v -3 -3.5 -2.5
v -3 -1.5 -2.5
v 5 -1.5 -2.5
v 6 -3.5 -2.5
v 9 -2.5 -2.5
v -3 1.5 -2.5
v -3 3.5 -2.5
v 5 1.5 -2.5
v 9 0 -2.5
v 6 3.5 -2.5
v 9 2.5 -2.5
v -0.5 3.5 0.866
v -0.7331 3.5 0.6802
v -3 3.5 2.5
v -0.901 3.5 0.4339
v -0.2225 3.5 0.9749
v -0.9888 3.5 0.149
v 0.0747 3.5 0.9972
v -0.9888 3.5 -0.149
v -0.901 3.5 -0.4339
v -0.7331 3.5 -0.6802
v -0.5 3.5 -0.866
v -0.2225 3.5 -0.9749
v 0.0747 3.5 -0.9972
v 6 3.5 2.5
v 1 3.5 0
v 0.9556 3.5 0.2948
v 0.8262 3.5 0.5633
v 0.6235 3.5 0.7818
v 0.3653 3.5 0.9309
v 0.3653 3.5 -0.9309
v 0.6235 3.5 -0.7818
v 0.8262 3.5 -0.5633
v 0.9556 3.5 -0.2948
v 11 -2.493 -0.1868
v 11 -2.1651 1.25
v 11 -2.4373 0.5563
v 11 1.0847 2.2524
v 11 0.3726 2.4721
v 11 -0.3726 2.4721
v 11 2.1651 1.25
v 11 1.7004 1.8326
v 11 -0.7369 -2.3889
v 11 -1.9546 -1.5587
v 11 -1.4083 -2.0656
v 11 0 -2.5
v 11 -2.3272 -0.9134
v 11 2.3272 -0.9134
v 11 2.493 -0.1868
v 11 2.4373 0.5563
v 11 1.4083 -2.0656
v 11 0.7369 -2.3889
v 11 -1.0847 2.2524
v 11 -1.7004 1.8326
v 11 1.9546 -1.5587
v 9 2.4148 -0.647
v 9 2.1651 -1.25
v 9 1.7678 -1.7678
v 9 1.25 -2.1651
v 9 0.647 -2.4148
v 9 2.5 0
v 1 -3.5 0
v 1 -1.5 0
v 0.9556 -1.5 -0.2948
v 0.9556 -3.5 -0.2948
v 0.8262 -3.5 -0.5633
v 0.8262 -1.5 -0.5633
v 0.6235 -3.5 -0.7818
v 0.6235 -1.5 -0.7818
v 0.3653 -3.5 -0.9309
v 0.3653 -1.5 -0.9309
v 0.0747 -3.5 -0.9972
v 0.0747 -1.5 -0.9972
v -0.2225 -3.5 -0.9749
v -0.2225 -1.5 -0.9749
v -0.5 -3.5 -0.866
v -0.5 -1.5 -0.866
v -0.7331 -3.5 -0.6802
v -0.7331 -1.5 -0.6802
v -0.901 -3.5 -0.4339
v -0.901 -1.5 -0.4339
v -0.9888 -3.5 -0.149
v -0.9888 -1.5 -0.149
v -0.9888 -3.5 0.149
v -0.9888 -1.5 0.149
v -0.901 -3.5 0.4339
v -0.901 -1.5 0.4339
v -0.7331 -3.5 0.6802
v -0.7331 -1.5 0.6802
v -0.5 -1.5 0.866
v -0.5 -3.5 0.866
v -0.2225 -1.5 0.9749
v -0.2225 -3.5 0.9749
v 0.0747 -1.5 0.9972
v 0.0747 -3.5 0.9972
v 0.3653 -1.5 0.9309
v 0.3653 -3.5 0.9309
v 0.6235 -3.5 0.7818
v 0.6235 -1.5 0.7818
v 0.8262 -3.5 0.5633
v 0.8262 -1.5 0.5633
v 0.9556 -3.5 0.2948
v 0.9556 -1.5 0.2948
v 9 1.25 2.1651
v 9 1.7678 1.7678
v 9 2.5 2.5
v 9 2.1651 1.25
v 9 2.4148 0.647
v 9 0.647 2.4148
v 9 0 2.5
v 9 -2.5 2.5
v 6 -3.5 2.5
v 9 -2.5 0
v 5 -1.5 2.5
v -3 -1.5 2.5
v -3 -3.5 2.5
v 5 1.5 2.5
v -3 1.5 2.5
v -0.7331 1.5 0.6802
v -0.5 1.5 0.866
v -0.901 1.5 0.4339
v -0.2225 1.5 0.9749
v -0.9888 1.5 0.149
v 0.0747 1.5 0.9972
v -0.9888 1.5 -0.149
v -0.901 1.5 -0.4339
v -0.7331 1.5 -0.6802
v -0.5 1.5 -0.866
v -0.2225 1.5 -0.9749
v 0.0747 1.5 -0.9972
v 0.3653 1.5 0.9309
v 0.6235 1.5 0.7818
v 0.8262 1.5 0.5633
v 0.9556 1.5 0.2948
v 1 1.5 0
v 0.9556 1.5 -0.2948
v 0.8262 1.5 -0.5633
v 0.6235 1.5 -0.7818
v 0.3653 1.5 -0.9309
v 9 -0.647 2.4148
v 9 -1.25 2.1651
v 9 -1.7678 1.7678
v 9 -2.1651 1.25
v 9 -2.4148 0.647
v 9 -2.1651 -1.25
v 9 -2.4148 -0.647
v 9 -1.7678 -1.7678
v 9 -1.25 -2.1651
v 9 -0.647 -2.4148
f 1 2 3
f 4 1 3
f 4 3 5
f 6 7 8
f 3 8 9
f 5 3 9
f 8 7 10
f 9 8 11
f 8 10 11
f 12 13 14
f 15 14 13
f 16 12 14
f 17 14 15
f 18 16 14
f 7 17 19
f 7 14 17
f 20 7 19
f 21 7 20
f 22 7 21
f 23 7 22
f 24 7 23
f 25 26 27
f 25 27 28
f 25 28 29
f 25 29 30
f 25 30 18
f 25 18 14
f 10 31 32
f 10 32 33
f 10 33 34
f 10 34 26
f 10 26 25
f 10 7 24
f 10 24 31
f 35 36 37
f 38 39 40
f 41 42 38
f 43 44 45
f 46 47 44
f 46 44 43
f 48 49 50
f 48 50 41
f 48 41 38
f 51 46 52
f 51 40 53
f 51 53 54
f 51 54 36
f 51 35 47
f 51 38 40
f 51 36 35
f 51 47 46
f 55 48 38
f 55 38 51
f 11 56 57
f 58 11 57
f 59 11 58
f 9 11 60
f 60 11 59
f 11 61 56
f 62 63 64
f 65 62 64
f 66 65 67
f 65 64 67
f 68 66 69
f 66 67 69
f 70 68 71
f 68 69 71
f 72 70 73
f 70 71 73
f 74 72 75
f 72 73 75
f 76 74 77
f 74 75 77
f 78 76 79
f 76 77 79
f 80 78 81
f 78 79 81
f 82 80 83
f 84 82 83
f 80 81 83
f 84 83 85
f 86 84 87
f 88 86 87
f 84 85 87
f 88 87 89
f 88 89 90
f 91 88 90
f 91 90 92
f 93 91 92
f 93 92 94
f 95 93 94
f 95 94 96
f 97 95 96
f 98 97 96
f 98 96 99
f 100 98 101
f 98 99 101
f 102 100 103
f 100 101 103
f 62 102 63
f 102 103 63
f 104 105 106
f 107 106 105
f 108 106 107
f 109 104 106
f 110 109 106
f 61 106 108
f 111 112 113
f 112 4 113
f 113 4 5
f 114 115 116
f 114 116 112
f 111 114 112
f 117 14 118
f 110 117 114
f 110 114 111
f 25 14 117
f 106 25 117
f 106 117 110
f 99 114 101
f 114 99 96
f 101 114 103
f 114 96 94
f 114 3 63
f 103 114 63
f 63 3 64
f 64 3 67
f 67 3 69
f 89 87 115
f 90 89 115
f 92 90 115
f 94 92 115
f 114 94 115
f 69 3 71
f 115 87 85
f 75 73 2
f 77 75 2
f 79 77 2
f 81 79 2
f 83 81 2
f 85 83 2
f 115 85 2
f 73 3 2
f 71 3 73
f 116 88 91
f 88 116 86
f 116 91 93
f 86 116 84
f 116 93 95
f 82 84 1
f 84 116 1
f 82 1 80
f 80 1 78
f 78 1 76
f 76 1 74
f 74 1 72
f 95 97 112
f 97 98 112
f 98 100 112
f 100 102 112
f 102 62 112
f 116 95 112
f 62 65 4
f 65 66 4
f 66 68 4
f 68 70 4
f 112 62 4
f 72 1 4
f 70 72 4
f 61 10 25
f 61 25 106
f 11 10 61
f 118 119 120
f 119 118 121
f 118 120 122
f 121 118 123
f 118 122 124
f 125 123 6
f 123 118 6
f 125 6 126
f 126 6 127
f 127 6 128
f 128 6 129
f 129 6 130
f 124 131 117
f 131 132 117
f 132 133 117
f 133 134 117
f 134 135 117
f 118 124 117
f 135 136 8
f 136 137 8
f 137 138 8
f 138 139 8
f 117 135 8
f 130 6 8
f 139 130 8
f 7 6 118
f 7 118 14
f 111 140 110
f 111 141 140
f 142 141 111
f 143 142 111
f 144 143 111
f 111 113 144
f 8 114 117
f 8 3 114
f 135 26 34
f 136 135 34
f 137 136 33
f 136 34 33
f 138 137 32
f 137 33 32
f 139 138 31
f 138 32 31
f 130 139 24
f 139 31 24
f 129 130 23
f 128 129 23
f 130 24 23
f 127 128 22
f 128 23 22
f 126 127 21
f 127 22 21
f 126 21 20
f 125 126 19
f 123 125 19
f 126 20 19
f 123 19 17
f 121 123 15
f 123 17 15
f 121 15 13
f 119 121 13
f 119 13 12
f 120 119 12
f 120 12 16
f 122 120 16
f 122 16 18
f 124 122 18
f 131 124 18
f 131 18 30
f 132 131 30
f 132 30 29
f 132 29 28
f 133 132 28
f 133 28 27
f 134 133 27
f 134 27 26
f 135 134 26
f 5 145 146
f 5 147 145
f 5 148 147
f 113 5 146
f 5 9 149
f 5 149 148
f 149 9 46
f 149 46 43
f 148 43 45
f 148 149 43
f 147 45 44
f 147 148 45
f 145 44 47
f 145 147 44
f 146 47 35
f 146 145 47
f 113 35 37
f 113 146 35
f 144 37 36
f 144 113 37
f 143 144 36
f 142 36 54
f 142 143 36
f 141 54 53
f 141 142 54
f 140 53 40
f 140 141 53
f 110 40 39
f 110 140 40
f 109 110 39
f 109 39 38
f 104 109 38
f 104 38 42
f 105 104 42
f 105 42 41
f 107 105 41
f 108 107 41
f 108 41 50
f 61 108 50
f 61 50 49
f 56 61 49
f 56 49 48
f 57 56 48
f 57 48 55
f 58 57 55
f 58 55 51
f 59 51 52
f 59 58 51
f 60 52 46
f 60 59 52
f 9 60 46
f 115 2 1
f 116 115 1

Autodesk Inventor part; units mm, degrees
ref_plane "YZ Plane" through (0, 0, 0) normal (1, 0, 0) x (0, 1, 0)
ref_plane "XZ Plane" through (0, 0, 0) normal (0, 1, 0) x (-1, 0, 0)
ref_plane "XY Plane" through (0, 0, 0) normal (0, 0, 1) x (1, 0, 0)
sketch "Skizze1" plane through (0, 0, 0) normal (0, 0, 1) x (1, 0, 0)
  line L0 (-3, 1.5) -> (5, 1.5)
  line L1 (-3, 1.5) -> (-3, 3.5)
  line L2 (-3, 3.5) -> (6, 3.5)
  line L3 (6, 3.5) -> (9, 2.5)
  line L4 (9, 2.5) -> (9, 0)
  line L5 (5, -1.5) -> (-3, -1.5)
  line L6 (-3, -1.5) -> (-3, -3.5)
  line L7 (-3, -3.5) -> (6, -3.5)
  line L8 (6, -3.5) -> (9, -2.5)
  line L9 (9, -2.5) -> (9, 0)
  line L10 (5, -1.5) -> (5, 1.5)
  point P0 (0, 0)
  point P1 (5, 0)
  dimension "d0" = 3
  dimension "d1" = 2
  dimension "d2" = 3
  dimension "d4" = 5
  dimension "d5" = 4
  dimension "d6" = 1
  dimension "d7" = 3
extrude "Extrusion1" add sketch "Skizze1" along normal mid plane 5
sketch "Skizze2" plane through (-3, 3.5, 2.5) normal (0, 1, 0) x (1, 0, 0)
  line L0 (3, 6) -> (3, -1) projected
  line L1 (14.4, 2.5) -> (-2.4, 2.5) projected
  circle A0 centre (3, 2.5) radius 1
  dimension "d10" = 2
extrude "Extrusion2" cut sketch "Skizze2" along normal through all both and the other way through all
sketch "Skizze3" plane through (9, -2.5, 2.5) normal (1, 0, 0) x (0, 0, -1)
  circle A0 centre (2.5, 2.5) radius 2.5
  line L0 (5, 5) -> (5, 0) projected
extrude "Extrusion3" add sketch "Skizze3" along normal blind 2
properties part number "Schakel"
